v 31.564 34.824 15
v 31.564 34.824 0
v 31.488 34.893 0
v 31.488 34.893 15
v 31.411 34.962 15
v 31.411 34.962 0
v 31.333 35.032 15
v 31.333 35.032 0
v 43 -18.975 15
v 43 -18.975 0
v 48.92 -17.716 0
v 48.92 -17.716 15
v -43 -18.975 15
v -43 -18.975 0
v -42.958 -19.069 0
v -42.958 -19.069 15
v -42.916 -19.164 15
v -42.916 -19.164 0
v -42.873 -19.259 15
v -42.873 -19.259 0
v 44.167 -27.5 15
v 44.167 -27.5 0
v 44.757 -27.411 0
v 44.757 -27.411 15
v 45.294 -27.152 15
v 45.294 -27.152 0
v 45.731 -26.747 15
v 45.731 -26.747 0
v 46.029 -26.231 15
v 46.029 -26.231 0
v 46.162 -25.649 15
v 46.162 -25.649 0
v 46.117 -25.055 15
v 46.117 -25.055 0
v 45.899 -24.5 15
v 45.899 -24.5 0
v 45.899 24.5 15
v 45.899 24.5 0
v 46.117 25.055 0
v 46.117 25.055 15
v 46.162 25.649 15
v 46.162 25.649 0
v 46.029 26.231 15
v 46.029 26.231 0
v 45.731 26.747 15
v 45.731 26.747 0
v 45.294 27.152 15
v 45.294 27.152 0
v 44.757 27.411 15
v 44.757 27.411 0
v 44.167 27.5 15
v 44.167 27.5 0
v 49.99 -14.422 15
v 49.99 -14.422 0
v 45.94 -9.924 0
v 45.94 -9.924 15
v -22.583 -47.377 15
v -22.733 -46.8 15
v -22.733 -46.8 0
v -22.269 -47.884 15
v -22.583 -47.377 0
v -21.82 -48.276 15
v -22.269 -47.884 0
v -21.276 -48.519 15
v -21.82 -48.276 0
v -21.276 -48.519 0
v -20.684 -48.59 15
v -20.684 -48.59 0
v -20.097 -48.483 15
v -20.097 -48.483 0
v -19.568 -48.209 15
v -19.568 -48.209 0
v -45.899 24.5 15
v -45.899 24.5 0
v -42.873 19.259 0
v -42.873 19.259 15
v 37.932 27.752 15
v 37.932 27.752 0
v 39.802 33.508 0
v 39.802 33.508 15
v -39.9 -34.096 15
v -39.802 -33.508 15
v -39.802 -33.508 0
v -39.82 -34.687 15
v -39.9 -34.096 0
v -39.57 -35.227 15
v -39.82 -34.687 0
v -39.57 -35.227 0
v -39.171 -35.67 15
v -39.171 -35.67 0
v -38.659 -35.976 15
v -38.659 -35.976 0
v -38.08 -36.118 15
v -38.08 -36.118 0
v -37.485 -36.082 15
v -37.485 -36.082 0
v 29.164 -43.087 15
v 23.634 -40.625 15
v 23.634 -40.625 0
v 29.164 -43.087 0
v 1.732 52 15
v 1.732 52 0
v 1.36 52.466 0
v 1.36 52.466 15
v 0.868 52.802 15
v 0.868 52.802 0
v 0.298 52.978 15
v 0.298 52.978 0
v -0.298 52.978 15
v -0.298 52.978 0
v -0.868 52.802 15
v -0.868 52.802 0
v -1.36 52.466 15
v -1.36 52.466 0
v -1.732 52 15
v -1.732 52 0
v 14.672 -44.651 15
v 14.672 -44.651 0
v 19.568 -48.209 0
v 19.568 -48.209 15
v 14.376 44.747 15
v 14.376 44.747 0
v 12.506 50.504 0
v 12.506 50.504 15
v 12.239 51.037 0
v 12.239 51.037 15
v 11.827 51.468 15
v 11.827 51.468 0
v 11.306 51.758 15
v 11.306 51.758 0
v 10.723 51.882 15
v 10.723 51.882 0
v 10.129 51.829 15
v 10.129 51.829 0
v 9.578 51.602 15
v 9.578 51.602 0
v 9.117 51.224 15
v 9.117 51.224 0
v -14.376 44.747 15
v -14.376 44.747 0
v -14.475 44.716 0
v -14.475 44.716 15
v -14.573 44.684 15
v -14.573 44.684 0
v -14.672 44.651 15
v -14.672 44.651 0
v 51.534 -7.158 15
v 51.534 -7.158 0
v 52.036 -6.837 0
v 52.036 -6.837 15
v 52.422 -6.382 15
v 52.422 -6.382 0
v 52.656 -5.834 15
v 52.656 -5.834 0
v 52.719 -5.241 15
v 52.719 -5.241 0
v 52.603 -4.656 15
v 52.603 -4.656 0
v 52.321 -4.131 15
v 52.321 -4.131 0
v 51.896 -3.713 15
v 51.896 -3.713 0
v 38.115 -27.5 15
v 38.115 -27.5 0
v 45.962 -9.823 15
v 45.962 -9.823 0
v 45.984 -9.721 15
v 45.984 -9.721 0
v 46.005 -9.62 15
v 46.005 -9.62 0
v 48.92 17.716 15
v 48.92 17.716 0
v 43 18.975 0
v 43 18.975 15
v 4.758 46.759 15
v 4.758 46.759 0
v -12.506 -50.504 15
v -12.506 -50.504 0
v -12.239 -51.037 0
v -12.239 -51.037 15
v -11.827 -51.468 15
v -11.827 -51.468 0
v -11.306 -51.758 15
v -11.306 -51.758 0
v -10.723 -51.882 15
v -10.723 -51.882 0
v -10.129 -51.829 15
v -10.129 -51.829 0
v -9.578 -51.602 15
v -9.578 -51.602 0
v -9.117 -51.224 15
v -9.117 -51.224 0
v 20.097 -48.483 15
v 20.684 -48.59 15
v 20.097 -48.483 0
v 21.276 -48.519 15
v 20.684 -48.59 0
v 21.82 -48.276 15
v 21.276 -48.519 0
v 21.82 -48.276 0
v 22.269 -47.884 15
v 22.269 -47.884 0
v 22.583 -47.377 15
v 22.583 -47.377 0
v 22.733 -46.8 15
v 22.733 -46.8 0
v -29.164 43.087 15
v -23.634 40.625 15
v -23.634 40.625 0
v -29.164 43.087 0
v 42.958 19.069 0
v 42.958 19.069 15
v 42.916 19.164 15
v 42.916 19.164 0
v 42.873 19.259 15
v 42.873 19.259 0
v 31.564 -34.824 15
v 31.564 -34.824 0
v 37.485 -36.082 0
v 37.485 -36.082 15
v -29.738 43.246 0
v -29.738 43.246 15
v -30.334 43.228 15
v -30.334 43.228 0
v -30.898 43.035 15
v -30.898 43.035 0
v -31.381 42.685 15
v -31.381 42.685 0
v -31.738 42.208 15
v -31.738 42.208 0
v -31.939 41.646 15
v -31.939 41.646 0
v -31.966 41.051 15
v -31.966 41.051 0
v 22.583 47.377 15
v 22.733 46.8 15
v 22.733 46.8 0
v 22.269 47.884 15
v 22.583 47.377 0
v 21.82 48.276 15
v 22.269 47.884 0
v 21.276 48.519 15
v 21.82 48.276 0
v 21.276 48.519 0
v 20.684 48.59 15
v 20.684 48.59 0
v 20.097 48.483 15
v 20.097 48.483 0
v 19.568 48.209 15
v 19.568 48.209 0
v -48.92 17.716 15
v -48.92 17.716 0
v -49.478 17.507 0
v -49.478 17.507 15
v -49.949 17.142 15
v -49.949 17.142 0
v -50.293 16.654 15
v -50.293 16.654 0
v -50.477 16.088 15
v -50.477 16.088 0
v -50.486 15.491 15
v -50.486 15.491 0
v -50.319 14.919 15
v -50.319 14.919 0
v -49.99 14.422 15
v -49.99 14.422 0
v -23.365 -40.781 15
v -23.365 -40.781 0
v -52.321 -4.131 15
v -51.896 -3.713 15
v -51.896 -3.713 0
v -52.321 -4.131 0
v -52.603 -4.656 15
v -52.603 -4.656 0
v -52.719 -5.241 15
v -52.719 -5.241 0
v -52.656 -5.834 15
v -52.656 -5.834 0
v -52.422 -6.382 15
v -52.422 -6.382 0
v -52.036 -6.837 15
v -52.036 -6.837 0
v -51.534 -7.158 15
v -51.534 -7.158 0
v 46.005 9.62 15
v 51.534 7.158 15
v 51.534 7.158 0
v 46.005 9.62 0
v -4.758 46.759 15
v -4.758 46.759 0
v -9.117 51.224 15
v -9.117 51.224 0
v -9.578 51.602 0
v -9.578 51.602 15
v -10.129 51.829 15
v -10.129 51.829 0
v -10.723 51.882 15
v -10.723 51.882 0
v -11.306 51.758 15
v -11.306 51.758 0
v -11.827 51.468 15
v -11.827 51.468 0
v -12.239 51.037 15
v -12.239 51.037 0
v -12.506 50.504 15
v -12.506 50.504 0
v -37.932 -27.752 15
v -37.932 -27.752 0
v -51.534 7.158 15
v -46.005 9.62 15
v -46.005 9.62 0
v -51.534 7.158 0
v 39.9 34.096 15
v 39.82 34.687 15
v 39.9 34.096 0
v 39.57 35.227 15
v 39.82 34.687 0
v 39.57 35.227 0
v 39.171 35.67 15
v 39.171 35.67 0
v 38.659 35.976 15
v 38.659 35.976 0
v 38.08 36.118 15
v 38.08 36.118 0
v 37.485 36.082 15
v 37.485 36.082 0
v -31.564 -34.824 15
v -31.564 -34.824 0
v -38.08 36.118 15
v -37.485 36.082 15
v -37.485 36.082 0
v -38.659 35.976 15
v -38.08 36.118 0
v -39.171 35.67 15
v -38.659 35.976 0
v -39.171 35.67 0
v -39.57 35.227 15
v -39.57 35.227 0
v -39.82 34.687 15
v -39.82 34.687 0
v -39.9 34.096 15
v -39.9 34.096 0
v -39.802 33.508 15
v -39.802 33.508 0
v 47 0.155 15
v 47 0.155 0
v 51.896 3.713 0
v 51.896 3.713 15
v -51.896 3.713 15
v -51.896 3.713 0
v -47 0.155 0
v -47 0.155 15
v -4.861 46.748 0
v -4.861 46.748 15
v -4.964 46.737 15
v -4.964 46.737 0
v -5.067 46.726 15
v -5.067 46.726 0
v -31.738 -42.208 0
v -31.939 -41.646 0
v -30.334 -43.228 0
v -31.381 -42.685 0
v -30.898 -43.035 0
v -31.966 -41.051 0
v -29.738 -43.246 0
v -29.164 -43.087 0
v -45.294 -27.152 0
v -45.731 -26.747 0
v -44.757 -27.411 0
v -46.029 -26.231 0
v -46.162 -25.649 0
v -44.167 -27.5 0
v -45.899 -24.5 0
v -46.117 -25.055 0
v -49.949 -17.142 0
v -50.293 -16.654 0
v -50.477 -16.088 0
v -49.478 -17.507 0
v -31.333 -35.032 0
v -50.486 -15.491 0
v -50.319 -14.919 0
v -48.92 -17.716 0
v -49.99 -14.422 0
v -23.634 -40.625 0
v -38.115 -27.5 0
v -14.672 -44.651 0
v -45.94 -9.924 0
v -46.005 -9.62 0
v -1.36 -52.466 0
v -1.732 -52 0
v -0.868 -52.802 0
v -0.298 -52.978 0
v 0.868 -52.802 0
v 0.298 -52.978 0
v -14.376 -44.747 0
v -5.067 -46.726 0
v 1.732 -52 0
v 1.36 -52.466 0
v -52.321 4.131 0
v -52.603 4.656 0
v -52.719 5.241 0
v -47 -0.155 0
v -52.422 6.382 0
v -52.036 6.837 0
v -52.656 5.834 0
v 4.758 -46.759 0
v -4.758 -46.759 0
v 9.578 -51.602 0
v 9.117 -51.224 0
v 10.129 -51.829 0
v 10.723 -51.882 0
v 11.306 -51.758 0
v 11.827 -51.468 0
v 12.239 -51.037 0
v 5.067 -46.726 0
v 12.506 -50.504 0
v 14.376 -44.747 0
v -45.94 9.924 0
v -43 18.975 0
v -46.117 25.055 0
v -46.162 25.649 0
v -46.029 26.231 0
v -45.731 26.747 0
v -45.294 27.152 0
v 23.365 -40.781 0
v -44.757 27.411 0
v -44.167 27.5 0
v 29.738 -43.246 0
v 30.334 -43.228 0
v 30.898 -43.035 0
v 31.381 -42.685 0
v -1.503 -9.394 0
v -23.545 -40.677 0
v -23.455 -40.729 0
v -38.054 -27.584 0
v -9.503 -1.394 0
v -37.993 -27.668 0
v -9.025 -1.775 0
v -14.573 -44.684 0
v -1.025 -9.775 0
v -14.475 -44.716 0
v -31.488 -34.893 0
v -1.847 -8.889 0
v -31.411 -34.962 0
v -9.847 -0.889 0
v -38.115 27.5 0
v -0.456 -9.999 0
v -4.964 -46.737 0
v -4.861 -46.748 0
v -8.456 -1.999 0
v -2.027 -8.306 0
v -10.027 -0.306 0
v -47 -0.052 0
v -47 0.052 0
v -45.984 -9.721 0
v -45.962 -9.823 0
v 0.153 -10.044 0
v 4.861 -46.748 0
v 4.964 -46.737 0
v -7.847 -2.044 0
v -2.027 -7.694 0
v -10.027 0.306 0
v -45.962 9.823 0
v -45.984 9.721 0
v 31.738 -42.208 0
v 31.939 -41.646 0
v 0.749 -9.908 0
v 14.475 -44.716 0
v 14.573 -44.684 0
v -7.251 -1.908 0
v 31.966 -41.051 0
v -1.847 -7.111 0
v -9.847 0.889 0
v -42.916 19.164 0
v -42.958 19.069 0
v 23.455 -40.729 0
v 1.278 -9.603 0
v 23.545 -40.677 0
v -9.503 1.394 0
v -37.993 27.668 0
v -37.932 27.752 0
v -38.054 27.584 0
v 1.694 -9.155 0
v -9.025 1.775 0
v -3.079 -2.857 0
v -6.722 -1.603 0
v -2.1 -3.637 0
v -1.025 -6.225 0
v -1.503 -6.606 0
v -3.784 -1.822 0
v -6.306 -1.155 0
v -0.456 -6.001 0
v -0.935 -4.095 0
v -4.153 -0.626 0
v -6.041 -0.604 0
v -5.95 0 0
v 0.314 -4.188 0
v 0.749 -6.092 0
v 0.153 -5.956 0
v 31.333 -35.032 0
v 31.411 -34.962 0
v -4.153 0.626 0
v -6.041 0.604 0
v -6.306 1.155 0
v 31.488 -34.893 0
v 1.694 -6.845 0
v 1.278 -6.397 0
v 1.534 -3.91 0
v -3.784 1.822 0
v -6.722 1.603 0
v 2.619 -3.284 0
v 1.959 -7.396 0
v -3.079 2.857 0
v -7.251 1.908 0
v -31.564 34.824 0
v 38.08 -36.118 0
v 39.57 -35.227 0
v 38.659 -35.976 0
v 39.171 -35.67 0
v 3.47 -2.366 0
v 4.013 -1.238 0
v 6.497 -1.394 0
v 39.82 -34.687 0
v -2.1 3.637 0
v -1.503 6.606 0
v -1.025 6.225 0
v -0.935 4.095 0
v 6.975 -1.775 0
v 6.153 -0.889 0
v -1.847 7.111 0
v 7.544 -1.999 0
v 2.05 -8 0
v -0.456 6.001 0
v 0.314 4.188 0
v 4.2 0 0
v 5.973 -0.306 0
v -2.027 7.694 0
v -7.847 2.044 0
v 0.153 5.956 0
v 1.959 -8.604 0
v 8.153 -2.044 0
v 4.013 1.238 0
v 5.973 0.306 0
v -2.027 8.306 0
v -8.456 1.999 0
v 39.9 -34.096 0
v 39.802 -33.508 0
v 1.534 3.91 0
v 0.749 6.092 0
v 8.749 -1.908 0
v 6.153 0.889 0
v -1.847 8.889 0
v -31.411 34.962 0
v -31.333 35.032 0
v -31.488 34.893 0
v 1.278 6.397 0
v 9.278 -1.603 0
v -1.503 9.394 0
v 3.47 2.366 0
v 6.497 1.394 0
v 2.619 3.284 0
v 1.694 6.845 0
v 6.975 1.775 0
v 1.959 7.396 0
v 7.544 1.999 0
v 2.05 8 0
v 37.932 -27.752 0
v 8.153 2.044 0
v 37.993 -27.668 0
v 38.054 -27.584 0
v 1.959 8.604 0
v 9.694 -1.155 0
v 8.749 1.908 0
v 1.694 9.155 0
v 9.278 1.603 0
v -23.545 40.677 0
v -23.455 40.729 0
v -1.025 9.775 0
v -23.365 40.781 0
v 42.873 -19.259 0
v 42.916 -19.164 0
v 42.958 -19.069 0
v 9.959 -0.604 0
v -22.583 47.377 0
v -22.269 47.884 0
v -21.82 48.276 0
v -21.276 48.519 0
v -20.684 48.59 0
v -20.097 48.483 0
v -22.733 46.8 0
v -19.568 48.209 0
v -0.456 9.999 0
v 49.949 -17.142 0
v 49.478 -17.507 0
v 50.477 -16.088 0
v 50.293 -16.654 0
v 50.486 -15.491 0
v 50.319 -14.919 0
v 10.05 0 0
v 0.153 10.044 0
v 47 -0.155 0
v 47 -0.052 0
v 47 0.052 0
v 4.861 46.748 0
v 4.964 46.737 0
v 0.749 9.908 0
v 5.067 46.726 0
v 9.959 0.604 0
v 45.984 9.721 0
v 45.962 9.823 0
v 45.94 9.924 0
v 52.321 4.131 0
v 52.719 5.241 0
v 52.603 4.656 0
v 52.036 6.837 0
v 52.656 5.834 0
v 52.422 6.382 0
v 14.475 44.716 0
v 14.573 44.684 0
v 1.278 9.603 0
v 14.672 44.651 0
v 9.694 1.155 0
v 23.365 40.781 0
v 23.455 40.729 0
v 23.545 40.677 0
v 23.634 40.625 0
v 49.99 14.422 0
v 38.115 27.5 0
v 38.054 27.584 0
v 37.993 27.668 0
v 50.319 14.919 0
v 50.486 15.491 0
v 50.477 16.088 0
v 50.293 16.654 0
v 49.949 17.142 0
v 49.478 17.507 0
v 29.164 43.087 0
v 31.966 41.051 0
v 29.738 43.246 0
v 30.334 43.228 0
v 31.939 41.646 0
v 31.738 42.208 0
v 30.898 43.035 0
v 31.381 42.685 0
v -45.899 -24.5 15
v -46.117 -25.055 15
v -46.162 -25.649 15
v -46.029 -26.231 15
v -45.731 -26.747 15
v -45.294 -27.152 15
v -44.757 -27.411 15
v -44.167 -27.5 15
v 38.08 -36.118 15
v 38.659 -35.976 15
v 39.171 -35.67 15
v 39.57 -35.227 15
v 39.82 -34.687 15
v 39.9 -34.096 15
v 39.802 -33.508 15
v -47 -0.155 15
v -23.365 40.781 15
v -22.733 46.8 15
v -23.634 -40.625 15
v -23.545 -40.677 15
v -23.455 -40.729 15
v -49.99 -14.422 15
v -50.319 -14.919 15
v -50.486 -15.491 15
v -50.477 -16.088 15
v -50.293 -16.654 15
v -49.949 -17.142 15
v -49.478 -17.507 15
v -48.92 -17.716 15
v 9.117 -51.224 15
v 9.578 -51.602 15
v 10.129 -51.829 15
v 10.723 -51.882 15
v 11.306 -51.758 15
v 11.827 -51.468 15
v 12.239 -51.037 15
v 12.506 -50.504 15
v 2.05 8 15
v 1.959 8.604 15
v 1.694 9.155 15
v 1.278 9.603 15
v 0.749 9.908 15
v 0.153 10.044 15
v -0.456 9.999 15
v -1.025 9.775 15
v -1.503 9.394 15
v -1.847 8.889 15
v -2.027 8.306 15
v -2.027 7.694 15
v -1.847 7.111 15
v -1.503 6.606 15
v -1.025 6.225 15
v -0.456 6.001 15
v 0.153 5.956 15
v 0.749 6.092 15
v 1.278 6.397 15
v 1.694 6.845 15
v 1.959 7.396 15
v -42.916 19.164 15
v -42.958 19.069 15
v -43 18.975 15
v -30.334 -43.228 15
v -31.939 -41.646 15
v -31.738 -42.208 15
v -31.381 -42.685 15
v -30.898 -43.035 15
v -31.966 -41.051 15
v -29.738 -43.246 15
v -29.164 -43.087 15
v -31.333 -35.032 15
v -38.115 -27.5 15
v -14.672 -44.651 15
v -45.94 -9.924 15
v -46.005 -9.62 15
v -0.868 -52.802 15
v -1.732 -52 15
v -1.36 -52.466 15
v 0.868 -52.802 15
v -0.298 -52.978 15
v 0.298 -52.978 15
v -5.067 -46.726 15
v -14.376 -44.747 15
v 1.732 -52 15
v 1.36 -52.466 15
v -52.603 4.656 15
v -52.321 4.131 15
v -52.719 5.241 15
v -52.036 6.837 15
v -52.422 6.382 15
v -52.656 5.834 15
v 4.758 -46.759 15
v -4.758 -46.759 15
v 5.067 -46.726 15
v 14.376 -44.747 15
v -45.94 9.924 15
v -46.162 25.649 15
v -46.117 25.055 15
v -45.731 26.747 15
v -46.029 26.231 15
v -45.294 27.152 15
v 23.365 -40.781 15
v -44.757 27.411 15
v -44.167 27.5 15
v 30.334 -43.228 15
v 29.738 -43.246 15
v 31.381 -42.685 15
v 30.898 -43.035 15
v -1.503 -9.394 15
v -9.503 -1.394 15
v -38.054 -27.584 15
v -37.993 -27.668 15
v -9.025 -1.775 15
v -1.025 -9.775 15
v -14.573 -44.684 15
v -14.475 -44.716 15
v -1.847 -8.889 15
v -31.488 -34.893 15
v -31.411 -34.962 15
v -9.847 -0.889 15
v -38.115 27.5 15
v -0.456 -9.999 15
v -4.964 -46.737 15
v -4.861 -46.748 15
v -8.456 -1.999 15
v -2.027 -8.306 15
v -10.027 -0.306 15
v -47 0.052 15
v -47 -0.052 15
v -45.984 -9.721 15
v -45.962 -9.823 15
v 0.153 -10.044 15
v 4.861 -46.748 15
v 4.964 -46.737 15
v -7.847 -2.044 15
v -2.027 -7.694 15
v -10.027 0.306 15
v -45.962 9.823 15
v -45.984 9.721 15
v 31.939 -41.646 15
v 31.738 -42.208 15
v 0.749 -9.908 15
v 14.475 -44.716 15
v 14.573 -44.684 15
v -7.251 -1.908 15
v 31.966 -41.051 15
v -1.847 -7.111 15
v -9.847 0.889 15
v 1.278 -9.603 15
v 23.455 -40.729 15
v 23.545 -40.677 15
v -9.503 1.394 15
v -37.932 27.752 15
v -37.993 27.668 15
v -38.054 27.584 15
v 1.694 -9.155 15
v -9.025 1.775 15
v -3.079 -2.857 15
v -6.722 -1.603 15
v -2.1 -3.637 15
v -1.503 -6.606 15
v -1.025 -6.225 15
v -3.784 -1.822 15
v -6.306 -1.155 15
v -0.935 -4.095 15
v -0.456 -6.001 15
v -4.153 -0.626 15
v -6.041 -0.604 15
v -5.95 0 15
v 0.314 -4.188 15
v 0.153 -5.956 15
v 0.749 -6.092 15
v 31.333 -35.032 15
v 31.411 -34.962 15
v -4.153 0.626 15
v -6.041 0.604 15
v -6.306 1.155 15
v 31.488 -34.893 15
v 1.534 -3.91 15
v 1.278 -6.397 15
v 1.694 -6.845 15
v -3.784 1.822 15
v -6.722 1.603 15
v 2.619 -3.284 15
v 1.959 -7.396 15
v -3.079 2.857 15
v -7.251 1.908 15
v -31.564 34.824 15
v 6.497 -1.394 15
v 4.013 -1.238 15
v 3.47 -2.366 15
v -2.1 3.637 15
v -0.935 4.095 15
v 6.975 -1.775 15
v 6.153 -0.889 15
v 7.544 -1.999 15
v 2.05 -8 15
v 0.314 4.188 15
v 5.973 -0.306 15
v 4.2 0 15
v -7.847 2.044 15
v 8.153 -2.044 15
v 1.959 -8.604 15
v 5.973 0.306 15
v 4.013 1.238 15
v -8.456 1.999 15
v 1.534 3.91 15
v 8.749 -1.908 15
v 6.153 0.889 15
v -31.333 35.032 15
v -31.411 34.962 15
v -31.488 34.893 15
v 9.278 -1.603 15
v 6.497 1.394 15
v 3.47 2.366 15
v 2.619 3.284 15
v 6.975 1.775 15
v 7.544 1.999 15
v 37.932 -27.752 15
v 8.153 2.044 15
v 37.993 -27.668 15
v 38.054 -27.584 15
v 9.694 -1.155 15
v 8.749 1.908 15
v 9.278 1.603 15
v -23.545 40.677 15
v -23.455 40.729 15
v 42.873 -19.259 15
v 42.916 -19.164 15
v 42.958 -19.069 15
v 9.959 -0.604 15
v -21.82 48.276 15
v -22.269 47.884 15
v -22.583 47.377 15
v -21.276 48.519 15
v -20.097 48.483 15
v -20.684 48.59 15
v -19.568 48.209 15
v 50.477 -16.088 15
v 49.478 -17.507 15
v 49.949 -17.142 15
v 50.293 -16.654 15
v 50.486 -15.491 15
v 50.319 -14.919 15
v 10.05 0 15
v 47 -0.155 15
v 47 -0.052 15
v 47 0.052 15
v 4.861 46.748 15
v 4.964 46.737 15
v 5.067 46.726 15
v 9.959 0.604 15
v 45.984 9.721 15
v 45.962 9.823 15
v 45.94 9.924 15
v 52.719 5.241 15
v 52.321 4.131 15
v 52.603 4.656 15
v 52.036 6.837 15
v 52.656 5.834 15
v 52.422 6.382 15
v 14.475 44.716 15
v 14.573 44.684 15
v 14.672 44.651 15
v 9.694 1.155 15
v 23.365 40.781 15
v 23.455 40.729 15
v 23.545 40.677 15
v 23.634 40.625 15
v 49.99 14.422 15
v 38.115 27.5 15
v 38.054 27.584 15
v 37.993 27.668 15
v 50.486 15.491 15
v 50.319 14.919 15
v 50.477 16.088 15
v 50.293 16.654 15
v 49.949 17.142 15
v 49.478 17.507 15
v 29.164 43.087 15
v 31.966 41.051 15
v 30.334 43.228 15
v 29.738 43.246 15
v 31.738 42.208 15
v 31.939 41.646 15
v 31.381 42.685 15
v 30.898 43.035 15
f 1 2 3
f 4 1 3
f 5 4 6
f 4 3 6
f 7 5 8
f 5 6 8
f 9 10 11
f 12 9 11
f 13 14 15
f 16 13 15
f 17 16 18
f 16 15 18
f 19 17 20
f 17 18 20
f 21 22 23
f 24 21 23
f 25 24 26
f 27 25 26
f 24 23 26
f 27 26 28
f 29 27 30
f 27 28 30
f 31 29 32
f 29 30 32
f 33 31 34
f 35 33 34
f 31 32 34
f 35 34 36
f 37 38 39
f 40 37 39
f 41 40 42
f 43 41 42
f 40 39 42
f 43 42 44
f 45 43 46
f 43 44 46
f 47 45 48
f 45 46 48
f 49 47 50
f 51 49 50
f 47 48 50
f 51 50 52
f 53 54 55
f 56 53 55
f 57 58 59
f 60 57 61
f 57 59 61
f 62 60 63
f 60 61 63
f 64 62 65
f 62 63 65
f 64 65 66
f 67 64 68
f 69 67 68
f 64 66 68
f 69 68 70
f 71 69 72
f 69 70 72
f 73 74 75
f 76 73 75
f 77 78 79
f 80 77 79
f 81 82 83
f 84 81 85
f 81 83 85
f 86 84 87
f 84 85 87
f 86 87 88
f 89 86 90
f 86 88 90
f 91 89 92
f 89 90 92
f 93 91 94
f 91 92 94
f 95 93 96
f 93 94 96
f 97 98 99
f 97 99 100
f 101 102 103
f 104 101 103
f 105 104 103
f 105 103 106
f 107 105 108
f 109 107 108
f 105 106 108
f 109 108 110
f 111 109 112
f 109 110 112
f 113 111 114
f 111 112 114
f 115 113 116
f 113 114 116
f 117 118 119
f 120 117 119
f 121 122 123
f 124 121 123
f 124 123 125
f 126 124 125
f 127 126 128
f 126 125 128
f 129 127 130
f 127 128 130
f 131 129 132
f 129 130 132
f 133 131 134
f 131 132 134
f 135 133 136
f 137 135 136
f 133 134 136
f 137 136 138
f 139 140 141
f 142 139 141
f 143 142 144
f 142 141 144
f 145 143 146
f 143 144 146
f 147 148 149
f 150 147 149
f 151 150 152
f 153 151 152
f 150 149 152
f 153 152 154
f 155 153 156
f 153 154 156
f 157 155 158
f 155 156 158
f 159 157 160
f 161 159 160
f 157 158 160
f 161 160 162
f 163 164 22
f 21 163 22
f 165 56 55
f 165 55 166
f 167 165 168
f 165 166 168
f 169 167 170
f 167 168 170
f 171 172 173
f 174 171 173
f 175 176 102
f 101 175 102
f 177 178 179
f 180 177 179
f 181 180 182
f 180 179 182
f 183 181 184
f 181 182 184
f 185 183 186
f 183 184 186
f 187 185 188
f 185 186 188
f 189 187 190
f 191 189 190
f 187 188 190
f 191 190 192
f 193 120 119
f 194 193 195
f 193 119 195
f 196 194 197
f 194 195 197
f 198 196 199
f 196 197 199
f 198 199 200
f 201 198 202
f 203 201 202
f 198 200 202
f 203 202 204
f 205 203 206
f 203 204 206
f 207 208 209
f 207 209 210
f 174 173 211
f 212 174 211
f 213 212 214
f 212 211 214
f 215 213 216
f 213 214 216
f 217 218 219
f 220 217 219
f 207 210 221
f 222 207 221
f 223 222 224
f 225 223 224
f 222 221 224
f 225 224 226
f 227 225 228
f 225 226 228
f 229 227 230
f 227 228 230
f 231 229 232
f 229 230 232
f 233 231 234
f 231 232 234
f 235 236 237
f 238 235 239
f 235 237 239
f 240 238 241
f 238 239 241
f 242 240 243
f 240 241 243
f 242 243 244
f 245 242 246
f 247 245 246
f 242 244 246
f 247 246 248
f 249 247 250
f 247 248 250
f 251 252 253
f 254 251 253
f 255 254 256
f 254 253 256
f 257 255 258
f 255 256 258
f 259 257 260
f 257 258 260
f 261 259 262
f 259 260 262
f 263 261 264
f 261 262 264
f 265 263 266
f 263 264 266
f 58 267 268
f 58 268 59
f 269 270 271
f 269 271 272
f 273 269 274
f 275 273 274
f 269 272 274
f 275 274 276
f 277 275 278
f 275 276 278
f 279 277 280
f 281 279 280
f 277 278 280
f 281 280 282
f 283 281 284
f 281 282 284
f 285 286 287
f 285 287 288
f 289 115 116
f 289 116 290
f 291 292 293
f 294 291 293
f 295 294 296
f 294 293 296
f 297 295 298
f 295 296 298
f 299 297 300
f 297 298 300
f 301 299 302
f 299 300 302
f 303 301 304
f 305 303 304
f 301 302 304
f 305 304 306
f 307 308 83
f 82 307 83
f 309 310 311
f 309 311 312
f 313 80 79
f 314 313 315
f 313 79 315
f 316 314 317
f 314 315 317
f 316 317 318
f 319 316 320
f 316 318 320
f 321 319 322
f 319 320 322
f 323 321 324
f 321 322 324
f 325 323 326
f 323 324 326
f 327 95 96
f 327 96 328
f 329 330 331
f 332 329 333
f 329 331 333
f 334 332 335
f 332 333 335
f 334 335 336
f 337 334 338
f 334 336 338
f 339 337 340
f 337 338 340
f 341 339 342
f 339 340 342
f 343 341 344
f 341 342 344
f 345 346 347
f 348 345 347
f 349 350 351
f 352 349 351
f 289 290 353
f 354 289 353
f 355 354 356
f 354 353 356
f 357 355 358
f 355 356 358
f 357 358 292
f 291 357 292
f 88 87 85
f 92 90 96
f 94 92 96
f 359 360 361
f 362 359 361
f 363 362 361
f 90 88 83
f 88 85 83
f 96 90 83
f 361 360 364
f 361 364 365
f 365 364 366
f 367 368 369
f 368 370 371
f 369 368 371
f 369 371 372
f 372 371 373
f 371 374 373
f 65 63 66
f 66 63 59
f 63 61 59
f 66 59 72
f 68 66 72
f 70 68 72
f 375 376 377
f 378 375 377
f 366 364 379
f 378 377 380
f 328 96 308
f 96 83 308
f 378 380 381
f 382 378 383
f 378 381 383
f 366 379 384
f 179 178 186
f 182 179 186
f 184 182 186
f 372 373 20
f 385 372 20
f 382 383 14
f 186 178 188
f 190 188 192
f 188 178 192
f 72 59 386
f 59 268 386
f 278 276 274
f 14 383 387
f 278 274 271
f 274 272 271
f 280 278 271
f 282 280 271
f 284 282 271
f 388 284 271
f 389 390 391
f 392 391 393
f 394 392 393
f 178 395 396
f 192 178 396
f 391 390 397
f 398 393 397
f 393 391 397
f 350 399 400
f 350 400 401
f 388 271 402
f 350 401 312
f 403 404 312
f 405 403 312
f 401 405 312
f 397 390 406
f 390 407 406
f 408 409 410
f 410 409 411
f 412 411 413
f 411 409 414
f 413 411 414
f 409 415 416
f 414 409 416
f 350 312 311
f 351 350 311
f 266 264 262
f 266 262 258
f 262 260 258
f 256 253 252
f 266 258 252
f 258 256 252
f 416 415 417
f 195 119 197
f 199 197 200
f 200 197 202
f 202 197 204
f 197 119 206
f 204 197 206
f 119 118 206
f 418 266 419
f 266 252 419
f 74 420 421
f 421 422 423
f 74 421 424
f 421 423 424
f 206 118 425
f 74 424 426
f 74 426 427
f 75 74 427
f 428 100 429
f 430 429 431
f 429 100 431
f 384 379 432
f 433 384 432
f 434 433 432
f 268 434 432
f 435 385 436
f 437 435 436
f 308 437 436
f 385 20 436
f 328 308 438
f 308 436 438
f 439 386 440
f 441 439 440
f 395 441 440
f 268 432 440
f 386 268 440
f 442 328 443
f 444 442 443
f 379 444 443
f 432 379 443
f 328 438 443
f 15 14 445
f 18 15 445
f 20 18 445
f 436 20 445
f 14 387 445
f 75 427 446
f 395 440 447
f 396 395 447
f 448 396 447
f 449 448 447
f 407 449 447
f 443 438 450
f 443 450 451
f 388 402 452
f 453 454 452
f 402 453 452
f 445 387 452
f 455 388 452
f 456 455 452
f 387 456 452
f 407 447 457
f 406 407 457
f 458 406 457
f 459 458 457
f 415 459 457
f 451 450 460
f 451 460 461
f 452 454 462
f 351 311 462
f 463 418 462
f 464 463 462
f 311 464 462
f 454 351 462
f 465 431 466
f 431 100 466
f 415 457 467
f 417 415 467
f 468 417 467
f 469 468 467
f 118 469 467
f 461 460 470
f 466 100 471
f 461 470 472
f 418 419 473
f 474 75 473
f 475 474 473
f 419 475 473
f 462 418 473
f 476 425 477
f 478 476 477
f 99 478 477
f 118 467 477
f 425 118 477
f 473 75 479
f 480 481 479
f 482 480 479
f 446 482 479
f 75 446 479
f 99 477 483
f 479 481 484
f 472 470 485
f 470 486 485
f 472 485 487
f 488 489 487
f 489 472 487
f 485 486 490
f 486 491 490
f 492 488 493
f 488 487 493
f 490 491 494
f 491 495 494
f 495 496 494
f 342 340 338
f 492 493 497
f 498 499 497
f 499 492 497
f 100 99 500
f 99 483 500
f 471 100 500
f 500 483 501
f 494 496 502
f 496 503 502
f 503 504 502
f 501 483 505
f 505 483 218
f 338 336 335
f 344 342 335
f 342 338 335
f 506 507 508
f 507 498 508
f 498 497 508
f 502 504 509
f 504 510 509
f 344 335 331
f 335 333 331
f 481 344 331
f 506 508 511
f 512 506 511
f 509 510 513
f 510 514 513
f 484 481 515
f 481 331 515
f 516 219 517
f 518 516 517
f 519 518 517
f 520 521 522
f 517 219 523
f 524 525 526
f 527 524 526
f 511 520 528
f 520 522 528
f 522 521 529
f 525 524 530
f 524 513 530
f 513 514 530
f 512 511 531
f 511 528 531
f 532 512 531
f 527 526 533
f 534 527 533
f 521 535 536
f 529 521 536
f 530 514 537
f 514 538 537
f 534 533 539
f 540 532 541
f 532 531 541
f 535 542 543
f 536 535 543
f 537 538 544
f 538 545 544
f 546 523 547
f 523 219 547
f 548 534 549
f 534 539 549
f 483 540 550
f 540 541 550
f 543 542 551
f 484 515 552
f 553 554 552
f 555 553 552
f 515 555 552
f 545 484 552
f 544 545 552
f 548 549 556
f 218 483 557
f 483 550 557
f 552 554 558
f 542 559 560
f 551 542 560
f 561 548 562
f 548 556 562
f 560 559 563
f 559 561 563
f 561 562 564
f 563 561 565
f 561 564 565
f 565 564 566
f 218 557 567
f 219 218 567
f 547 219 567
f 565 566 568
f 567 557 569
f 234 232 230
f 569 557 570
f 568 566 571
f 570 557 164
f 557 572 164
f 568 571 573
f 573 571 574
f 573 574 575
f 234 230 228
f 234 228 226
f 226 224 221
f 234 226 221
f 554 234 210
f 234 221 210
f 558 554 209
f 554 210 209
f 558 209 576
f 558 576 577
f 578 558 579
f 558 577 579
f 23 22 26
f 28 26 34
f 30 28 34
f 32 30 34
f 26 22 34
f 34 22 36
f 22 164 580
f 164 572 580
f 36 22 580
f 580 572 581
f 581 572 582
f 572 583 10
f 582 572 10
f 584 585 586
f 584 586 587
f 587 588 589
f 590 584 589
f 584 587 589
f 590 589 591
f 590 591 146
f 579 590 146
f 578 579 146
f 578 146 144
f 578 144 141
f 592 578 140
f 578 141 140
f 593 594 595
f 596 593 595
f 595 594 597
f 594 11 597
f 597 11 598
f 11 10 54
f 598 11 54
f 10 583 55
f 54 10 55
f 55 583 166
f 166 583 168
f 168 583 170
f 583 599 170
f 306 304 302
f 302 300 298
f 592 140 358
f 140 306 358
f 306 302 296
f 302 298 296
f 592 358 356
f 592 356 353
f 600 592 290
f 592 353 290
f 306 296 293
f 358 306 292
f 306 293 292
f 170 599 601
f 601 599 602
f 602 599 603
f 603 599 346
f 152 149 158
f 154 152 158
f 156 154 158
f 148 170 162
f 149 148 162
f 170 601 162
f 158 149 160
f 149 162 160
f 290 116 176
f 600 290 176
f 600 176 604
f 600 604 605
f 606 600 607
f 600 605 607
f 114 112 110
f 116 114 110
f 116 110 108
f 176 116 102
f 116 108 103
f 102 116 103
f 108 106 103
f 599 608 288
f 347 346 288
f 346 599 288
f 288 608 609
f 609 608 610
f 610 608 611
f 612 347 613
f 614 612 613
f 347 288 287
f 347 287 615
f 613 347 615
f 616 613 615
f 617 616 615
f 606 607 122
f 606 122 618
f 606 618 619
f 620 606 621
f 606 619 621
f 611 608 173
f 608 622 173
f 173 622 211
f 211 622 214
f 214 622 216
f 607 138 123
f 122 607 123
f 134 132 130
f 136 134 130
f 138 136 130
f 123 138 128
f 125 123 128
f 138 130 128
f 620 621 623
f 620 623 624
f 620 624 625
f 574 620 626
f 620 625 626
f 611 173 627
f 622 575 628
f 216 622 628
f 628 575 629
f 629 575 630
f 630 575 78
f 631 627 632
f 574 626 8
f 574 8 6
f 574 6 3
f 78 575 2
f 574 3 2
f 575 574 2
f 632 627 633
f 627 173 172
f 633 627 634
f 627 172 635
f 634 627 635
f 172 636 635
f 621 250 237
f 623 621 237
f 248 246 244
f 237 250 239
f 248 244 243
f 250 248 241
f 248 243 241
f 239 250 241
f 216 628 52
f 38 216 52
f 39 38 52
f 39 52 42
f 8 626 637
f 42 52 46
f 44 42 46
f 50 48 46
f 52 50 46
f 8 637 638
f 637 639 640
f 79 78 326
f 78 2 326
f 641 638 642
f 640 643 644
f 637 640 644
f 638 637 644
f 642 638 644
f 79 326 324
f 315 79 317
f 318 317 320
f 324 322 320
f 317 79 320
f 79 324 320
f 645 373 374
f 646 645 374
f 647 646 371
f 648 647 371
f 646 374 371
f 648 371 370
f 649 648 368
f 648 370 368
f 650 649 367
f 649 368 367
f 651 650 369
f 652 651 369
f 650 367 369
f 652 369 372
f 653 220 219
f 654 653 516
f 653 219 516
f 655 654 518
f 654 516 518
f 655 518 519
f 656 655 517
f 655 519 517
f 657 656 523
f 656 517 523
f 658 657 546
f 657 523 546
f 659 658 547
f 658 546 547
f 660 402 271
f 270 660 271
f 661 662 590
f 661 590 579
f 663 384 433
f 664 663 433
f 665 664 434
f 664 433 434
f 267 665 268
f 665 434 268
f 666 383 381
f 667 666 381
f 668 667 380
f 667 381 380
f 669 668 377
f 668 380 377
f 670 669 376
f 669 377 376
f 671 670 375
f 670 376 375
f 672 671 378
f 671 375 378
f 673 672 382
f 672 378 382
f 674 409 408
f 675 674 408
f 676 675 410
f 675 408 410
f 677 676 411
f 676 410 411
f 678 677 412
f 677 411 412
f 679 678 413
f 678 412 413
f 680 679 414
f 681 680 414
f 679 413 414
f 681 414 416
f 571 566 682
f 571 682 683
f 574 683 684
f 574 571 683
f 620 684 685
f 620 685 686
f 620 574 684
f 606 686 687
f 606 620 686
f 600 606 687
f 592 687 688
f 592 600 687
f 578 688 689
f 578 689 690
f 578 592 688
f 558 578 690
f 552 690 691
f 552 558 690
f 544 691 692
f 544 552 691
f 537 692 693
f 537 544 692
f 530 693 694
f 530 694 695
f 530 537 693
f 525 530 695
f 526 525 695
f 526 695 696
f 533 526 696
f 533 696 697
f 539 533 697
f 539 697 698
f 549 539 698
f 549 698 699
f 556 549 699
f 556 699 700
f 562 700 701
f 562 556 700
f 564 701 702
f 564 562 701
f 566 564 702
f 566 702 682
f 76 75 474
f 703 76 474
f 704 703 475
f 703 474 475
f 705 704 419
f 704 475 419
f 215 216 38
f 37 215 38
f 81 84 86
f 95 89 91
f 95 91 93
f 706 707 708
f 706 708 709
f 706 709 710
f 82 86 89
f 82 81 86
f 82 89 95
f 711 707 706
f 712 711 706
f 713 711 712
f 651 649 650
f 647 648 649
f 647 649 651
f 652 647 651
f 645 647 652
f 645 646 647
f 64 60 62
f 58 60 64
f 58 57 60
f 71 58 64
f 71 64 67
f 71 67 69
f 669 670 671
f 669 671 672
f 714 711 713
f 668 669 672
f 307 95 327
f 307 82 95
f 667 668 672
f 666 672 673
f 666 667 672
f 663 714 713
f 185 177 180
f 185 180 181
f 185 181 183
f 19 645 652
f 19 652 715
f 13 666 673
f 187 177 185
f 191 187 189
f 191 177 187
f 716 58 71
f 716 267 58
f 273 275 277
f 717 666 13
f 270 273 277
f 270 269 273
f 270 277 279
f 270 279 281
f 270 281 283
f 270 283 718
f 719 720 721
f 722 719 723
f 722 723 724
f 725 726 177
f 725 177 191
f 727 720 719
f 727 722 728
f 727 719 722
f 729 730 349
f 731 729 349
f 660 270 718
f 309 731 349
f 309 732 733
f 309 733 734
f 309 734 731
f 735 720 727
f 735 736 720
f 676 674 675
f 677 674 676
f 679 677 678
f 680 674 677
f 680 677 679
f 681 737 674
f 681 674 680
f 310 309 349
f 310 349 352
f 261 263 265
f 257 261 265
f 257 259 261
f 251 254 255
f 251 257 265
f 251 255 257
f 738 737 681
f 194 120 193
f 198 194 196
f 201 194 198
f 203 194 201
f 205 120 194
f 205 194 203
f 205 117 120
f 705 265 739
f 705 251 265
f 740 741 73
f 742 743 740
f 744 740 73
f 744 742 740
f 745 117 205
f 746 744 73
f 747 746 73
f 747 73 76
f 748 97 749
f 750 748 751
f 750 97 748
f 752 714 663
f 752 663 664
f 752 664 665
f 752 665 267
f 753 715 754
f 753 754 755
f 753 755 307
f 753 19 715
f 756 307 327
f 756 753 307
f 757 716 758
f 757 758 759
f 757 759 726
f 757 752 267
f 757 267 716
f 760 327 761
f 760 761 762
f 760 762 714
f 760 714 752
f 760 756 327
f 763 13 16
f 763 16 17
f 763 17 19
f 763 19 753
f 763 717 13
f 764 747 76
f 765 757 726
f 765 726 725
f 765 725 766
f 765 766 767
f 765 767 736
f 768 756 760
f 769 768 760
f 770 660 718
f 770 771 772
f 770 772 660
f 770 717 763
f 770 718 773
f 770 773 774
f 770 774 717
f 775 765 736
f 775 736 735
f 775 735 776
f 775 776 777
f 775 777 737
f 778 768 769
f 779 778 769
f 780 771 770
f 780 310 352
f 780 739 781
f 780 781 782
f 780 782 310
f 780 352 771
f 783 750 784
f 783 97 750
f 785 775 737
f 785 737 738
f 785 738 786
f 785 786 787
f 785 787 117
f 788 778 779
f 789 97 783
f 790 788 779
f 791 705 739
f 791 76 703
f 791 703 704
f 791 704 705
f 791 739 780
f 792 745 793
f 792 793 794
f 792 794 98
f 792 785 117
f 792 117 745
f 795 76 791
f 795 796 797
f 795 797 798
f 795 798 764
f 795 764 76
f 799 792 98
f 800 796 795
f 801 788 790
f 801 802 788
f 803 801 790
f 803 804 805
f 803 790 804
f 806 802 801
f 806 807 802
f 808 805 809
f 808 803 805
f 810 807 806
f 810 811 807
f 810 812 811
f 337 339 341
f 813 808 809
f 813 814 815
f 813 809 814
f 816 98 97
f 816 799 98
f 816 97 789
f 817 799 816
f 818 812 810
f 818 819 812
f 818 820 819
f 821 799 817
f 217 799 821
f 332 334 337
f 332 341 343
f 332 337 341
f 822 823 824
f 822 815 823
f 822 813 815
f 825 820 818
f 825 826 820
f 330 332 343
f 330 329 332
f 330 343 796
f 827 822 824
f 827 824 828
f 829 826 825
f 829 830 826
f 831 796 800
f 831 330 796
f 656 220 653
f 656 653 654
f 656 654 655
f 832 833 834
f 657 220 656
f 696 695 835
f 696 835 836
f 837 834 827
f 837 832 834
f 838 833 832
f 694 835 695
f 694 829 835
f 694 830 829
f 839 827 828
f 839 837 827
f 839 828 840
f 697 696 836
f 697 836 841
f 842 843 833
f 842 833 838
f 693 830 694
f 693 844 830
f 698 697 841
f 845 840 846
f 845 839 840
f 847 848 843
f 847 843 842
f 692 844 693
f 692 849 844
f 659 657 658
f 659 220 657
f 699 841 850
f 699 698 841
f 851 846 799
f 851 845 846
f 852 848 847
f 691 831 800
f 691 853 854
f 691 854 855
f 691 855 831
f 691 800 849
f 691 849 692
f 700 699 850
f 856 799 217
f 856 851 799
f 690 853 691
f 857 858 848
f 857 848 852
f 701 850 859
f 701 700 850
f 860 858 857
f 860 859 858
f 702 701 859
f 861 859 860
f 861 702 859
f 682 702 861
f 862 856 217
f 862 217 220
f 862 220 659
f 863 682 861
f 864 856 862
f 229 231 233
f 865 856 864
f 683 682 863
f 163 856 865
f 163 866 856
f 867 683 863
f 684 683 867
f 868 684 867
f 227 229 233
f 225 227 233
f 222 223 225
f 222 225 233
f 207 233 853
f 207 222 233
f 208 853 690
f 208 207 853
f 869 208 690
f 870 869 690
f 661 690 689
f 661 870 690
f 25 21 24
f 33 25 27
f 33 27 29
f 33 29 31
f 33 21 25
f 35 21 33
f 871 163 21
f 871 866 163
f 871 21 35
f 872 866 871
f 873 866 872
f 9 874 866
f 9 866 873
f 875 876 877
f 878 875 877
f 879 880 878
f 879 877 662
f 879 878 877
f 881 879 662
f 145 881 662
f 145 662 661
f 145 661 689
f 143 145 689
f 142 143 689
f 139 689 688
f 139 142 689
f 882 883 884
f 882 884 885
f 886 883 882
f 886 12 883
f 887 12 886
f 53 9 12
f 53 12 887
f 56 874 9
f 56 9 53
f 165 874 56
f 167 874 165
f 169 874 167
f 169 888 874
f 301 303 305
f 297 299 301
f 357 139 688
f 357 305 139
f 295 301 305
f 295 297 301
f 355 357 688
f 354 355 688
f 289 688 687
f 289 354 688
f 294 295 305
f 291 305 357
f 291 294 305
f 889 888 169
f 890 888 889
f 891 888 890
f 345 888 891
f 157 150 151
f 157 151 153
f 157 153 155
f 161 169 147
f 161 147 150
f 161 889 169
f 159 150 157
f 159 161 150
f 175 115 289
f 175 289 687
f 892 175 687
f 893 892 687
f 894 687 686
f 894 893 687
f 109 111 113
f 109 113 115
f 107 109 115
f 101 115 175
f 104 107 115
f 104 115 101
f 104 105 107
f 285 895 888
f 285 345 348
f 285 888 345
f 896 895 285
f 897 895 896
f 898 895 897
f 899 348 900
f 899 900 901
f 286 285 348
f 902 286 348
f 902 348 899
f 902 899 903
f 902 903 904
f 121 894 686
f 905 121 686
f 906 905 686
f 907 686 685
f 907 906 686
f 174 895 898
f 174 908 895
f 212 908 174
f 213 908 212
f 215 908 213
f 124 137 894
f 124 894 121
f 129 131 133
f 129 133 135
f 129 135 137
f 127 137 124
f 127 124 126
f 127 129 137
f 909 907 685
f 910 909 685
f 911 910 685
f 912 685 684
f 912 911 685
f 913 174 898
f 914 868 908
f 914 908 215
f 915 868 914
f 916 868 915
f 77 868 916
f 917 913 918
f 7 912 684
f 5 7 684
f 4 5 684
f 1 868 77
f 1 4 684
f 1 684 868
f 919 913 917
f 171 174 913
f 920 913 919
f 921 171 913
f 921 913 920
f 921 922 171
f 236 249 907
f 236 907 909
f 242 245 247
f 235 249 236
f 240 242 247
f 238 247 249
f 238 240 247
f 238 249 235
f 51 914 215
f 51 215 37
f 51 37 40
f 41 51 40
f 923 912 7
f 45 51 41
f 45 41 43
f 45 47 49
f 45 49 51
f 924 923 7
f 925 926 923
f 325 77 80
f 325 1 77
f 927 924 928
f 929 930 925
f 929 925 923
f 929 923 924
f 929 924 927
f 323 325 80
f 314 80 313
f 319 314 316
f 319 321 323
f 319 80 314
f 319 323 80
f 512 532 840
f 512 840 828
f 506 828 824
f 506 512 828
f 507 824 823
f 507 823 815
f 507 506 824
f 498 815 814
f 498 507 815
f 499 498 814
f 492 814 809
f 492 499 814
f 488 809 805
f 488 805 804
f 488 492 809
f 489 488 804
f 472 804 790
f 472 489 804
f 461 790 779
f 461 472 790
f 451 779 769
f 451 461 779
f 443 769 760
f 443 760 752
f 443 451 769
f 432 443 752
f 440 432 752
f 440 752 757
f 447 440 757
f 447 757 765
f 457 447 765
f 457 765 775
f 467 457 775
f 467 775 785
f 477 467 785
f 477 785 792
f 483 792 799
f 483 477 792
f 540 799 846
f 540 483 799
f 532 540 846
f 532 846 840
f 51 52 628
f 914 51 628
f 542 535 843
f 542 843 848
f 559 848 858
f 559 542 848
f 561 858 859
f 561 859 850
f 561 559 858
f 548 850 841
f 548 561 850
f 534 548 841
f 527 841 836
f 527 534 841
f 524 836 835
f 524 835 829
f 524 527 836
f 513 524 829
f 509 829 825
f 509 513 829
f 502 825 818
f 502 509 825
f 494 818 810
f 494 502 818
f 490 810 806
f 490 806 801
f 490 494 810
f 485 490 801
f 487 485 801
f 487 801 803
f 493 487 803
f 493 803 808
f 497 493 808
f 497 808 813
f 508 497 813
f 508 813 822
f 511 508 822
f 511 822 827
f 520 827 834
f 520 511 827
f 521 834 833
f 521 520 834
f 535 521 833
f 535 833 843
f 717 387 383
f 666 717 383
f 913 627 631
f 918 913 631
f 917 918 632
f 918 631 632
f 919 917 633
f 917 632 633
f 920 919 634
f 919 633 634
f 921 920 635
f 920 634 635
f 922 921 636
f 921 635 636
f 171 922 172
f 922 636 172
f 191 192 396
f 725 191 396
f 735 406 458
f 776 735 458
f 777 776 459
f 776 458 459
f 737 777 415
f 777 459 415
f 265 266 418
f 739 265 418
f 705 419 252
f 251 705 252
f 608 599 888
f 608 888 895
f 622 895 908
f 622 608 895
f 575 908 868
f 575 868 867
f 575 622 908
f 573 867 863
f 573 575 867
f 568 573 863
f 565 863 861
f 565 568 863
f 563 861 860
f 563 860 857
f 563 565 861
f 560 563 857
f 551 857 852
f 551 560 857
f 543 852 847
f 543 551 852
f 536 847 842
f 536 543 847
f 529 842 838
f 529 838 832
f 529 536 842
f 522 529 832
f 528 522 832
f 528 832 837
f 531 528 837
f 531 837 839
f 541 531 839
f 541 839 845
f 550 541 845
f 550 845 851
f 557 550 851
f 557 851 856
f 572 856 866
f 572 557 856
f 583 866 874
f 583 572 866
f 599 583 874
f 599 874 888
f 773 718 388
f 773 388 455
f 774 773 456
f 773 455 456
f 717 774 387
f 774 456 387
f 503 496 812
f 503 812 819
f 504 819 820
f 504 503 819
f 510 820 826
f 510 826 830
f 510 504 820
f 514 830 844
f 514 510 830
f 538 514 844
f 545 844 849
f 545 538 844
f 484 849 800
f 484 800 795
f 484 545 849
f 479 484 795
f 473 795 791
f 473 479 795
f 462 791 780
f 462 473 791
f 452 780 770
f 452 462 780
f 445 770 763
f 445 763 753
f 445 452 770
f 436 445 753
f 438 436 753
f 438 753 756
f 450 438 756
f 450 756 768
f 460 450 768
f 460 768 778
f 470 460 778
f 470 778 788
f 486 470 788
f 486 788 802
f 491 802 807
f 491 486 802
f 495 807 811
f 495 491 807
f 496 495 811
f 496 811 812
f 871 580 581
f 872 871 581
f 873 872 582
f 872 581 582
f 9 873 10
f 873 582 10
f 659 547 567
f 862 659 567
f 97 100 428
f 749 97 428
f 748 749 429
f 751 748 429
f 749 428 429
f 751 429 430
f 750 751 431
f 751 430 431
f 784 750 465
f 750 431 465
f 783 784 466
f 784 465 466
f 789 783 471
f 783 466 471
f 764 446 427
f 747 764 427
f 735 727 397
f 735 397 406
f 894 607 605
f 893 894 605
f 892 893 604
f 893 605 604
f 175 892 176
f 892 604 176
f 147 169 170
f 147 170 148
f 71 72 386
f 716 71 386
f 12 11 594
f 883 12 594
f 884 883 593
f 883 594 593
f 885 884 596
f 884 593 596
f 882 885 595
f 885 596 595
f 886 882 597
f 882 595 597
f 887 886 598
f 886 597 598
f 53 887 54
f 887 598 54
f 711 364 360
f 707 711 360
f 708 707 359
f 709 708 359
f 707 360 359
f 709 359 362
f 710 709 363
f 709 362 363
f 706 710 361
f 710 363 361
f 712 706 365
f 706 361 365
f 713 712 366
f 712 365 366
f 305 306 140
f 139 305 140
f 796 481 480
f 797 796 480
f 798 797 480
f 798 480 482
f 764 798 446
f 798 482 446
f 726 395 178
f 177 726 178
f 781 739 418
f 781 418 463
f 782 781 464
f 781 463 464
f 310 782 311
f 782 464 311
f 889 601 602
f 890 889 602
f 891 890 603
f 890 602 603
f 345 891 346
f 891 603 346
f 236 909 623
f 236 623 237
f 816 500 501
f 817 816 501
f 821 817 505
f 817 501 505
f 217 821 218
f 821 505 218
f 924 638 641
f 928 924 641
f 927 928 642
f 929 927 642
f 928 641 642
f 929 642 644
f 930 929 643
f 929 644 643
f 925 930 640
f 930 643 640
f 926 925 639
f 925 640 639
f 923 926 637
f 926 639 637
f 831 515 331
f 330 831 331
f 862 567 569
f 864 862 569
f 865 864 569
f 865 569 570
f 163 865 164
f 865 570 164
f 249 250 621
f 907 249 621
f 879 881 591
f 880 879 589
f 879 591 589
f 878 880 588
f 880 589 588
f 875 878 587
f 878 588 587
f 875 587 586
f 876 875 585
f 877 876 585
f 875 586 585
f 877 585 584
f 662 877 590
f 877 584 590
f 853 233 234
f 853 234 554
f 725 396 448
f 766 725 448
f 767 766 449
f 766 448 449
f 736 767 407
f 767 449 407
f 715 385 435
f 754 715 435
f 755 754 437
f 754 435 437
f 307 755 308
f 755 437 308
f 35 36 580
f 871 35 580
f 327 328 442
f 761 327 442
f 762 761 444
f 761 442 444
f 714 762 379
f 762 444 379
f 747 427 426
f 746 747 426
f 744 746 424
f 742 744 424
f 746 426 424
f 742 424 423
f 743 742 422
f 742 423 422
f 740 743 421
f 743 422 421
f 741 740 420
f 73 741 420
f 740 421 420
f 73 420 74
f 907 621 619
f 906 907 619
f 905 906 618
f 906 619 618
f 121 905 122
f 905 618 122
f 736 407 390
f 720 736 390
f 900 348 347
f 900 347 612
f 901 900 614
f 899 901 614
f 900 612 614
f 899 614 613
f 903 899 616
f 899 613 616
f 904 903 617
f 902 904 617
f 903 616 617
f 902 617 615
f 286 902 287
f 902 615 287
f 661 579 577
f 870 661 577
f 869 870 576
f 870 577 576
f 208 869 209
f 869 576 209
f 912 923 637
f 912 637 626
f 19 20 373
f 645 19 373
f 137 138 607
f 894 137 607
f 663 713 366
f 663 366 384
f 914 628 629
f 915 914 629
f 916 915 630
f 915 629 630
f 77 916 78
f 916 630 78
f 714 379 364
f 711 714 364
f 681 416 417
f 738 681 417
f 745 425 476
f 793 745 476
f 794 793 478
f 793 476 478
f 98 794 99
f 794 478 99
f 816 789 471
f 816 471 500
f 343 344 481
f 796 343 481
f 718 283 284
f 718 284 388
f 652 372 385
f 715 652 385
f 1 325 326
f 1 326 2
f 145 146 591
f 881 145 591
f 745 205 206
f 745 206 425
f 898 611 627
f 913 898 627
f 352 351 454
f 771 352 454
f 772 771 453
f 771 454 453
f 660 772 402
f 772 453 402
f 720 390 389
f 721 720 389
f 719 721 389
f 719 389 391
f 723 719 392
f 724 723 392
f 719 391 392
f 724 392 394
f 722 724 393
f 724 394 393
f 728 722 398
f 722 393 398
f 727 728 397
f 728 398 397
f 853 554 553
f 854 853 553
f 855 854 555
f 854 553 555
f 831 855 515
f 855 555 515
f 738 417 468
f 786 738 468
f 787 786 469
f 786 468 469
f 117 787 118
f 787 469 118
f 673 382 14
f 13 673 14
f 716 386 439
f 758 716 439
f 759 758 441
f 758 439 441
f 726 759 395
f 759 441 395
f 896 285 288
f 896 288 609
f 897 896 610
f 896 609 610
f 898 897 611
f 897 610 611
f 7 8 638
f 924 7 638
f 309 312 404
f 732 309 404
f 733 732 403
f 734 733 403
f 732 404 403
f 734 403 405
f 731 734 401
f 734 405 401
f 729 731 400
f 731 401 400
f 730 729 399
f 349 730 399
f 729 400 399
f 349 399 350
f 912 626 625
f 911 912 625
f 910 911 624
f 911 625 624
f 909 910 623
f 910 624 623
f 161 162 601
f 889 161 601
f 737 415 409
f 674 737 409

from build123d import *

# Parameters (mm, degrees)
SKETCH1_R           = 4.2
SKETCH1_R_2         = 2.05
BOSS_EXTRUDE1_DEPTH = 15


with BuildPart() as part:
    # Sketch1 → Boss-Extrude1 (new body)
    with BuildSketch(Plane.XY):
        with BuildLine():
            Line((-1.732050808, 52), (-4.758219757, 46.758521627))
            ThreePointArc((-4.758219757, 46.758521627), (-4.912837774, 46.742529082), (-5.067402052, 46.726025258))
            Line((-5.067402052, 46.726025258), (-9.117206581, 51.22378885))
            ThreePointArc((-9.117206581, 51.22378885), (-11.019319613, 51.841822839), (-12.505609264, 50.503561626))
            Line((-12.505609264, 50.503561626), (-14.375884531, 44.747446228))
            ThreePointArc((-14.375884531, 44.747446228), (-14.523798736, 44.699656266), (-14.671554076, 44.651377369))
            Line((-14.671554076, 44.651377369), (-19.567998292, 48.208852329))
            ThreePointArc((-19.567998292, 48.208852329), (-21.557042083, 48.417909255), (-22.732612588, 46.799875266))
            Line((-22.732612588, 46.799875266), (-23.365254167, 40.780692707))
            ThreePointArc((-23.365254167, 40.780692707), (-23.5, 40.703193978), (-23.634488785, 40.625250029))
            Line((-23.634488785, 40.625250029), (-29.163574581, 43.086957628))
            ThreePointArc((-29.163574581, 43.086957628), (-31.152618372, 42.877900702), (-31.966091658, 41.050809787))
            Line((-31.966091658, 41.050809787), (-31.333450078, 35.031627228))
            ThreePointArc((-31.333450078, 35.031627228), (-31.449138499, 34.927806797), (-31.564482923, 34.82360432))
            Line((-31.564482923, 34.82360432), (-37.484562718, 36.081956126))
            ThreePointArc((-37.484562718, 36.081956126), (-39.38667575, 35.463922137), (-39.802499132, 33.507626936))
            Line((-39.802499132, 33.507626936), (-37.932223865, 27.751511538))
            ThreePointArc((-37.932223865, 27.751511538), (-38.023798736, 27.625906858), (-38.114957694, 27.5))
            Line((-38.114957694, 27.5), (-44.167295593, 27.5))
            ThreePointArc((-44.167295593, 27.5), (-45.899346401, 26.5), (-45.899346401, 24.5))
            Line((-45.899346401, 24.5), (-42.873177451, 19.258521627))
            ThreePointArc((-42.873177451, 19.258521627), (-42.936636509, 19.116622225), (-42.999625918, 18.974513721))
            Line((-42.999625918, 18.974513721), (-48.919705713, 17.716161915))
            ThreePointArc((-48.919705713, 17.716161915), (-50.405995364, 16.377900702), (-49.990171982, 14.4216055))
            Line((-49.990171982, 14.4216055), (-45.940367454, 9.923841909))
            ThreePointArc((-45.940367454, 9.923841909), (-45.972937234, 9.771849468), (-46.005004154, 9.619750142))
            Line((-46.005004154, 9.619750142), (-51.53408995, 7.158042542))
            ThreePointArc((-51.53408995, 7.158042542), (-52.709660455, 5.540008553), (-51.896187168, 3.712917638))
            Line((-51.896187168, 3.712917638), (-46.999742952, 0.155442679))
            ThreePointArc((-46.999742952, 0.155442679), (-47, 0), (-46.999742952, -0.155442679))
            Line((-46.999742952, -0.155442679), (-51.896187168, -3.712917638))
            ThreePointArc((-51.896187168, -3.712917638), (-52.709660455, -5.540008553), (-51.53408995, -7.158042542))
            Line((-51.53408995, -7.158042542), (-46.005004154, -9.619750142))
            ThreePointArc((-46.005004154, -9.619750142), (-45.972937234, -9.771849468), (-45.940367454, -9.923841909))
            Line((-45.940367454, -9.923841909), (-49.990171982, -14.4216055))
            ThreePointArc((-49.990171982, -14.4216055), (-50.405995364, -16.377900702), (-48.919705713, -17.716161915))
            Line((-48.919705713, -17.716161915), (-42.999625918, -18.974513721))
            ThreePointArc((-42.999625918, -18.974513721), (-42.936636509, -19.116622225), (-42.873177451, -19.258521627))
            Line((-42.873177451, -19.258521627), (-45.899346401, -24.5))
            ThreePointArc((-45.899346401, -24.5), (-45.899346401, -26.5), (-44.167295593, -27.5))
            Line((-44.167295593, -27.5), (-38.114957694, -27.5))
            ThreePointArc((-38.114957694, -27.5), (-38.023798736, -27.625906858), (-37.932223865, -27.751511538))
            Line((-37.932223865, -27.751511538), (-39.802499132, -33.507626936))
            ThreePointArc((-39.802499132, -33.507626936), (-39.38667575, -35.463922137), (-37.484562718, -36.081956126))
            Line((-37.484562718, -36.081956126), (-31.564482923, -34.82360432))
            ThreePointArc((-31.564482923, -34.82360432), (-31.449138499, -34.927806797), (-31.333450078, -35.031627228))
            Line((-31.333450078, -35.031627228), (-31.966091658, -41.050809787))
            ThreePointArc((-31.966091658, -41.050809787), (-31.152618372, -42.877900702), (-29.163574581, -43.086957628))
            Line((-29.163574581, -43.086957628), (-23.634488785, -40.625250029))
            ThreePointArc((-23.634488785, -40.625250029), (-23.5, -40.703193978), (-23.365254167, -40.780692707))
            Line((-23.365254167, -40.780692707), (-22.732612588, -46.799875266))
            ThreePointArc((-22.732612588, -46.799875266), (-21.557042083, -48.417909255), (-19.567998292, -48.208852329))
            Line((-19.567998292, -48.208852329), (-14.671554076, -44.651377369))
            ThreePointArc((-14.671554076, -44.651377369), (-14.523798736, -44.699656266), (-14.375884531, -44.747446228))
            Line((-14.375884531, -44.747446228), (-12.505609264, -50.503561626))
            ThreePointArc((-12.505609264, -50.503561626), (-11.019319613, -51.841822839), (-9.117206581, -51.22378885))
            Line((-9.117206581, -51.22378885), (-5.067402052, -46.726025258))
            ThreePointArc((-5.067402052, -46.726025258), (-4.912837774, -46.742529082), (-4.758219757, -46.758521627))
            Line((-4.758219757, -46.758521627), (-1.732050808, -52))
            ThreePointArc((-1.732050808, -52), (0, -53), (1.732050808, -52))
            Line((1.732050808, -52), (4.758219757, -46.758521627))
            ThreePointArc((4.758219757, -46.758521627), (4.912837774, -46.742529082), (5.067402052, -46.726025258))
            Line((5.067402052, -46.726025258), (9.117206581, -51.22378885))
            ThreePointArc((9.117206581, -51.22378885), (11.019319613, -51.841822839), (12.505609264, -50.503561626))
            Line((12.505609264, -50.503561626), (14.375884531, -44.747446228))
            ThreePointArc((14.375884531, -44.747446228), (14.523798736, -44.699656266), (14.671554076, -44.651377369))
            Line((14.671554076, -44.651377369), (19.567998292, -48.208852329))
            ThreePointArc((19.567998292, -48.208852329), (21.557042083, -48.417909255), (22.732612588, -46.799875266))
            Line((22.732612588, -46.799875266), (23.365254167, -40.780692707))
            ThreePointArc((23.365254167, -40.780692707), (23.5, -40.703193978), (23.634488785, -40.625250029))
            Line((23.634488785, -40.625250029), (29.163574581, -43.086957628))
            ThreePointArc((29.163574581, -43.086957628), (31.152618372, -42.877900702), (31.966091658, -41.050809787))
            Line((31.966091658, -41.050809787), (31.333450078, -35.031627228))
            ThreePointArc((31.333450078, -35.031627228), (31.449138499, -34.927806797), (31.564482923, -34.82360432))
            Line((31.564482923, -34.82360432), (37.484562718, -36.081956126))
            ThreePointArc((37.484562718, -36.081956126), (39.38667575, -35.463922137), (39.802499132, -33.507626936))
            Line((39.802499132, -33.507626936), (37.932223865, -27.751511538))
            ThreePointArc((37.932223865, -27.751511538), (38.023798736, -27.625906858), (38.114957694, -27.5))
            Line((38.114957694, -27.5), (44.167295593, -27.5))
            ThreePointArc((44.167295593, -27.5), (45.899346401, -26.5), (45.899346401, -24.5))
            Line((45.899346401, -24.5), (42.873177451, -19.258521627))
            ThreePointArc((42.873177451, -19.258521627), (42.936636509, -19.116622225), (42.999625918, -18.974513721))
            Line((42.999625918, -18.974513721), (48.919705713, -17.716161915))
            ThreePointArc((48.919705713, -17.716161915), (50.405995364, -16.377900702), (49.990171982, -14.4216055))
            Line((49.990171982, -14.4216055), (45.940367454, -9.923841909))
            ThreePointArc((45.940367454, -9.923841909), (45.972937234, -9.771849468), (46.005004154, -9.619750142))
            Line((46.005004154, -9.619750142), (51.53408995, -7.158042542))
            ThreePointArc((51.53408995, -7.158042542), (52.709660455, -5.540008553), (51.896187168, -3.712917638))
            Line((51.896187168, -3.712917638), (46.999742952, -0.155442679))
            ThreePointArc((46.999742952, -0.155442679), (47, 0), (46.999742952, 0.155442679))
            Line((46.999742952, 0.155442679), (51.896187168, 3.712917638))
            ThreePointArc((51.896187168, 3.712917638), (52.709660455, 5.540008553), (51.53408995, 7.158042542))
            Line((51.53408995, 7.158042542), (46.005004154, 9.619750142))
            ThreePointArc((46.005004154, 9.619750142), (45.972937234, 9.771849468), (45.940367454, 9.923841909))
            Line((45.940367454, 9.923841909), (49.990171982, 14.4216055))
            ThreePointArc((49.990171982, 14.4216055), (50.405995364, 16.377900702), (48.919705713, 17.716161915))
            Line((48.919705713, 17.716161915), (42.999625918, 18.974513721))
            ThreePointArc((42.999625918, 18.974513721), (42.936636509, 19.116622225), (42.873177451, 19.258521627))
            Line((42.873177451, 19.258521627), (45.899346401, 24.5))
            ThreePointArc((45.899346401, 24.5), (45.899346401, 26.5), (44.167295593, 27.5))
            Line((44.167295593, 27.5), (38.114957694, 27.5))
            ThreePointArc((38.114957694, 27.5), (38.023798736, 27.625906858), (37.932223865, 27.751511538))
            Line((37.932223865, 27.751511538), (39.802499132, 33.507626936))
            ThreePointArc((39.802499132, 33.507626936), (39.38667575, 35.463922137), (37.484562718, 36.081956126))
            Line((37.484562718, 36.081956126), (31.564482923, 34.82360432))
            ThreePointArc((31.564482923, 34.82360432), (31.449138499, 34.927806797), (31.333450078, 35.031627228))
            Line((31.333450078, 35.031627228), (31.966091658, 41.050809787))
            ThreePointArc((31.966091658, 41.050809787), (31.152618372, 42.877900702), (29.163574581, 43.086957628))
            Line((29.163574581, 43.086957628), (23.634488785, 40.625250029))
            ThreePointArc((23.634488785, 40.625250029), (23.5, 40.703193978), (23.365254167, 40.780692707))
            Line((23.365254167, 40.780692707), (22.732612588, 46.799875266))
            ThreePointArc((22.732612588, 46.799875266), (21.557042083, 48.417909255), (19.567998292, 48.208852329))
            Line((19.567998292, 48.208852329), (14.671554076, 44.651377369))
            ThreePointArc((14.671554076, 44.651377369), (14.523798736, 44.699656266), (14.375884531, 44.747446228))
            Line((14.375884531, 44.747446228), (12.505609264, 50.503561626))
            ThreePointArc((12.505609264, 50.503561626), (11.019319613, 51.841822839), (9.117206581, 51.22378885))
            Line((9.117206581, 51.22378885), (5.067402052, 46.726025258))
            ThreePointArc((5.067402052, 46.726025258), (4.912837774, 46.742529082), (4.758219757, 46.758521627))
            Line((4.758219757, 46.758521627), (1.732050808, 52))
            ThreePointArc((1.732050808, 52), (0, 53), (-1.732050808, 52))
        make_face()
        Circle(SKETCH1_R, mode=Mode.SUBTRACT)
        with Locations((0, 8)):
            Circle(SKETCH1_R_2, mode=Mode.SUBTRACT)
        with Locations((8, 0)):
            Circle(SKETCH1_R_2, mode=Mode.SUBTRACT)
        with Locations((0, -8)):
            Circle(SKETCH1_R_2, mode=Mode.SUBTRACT)
        with Locations((-8, 0)):
            Circle(SKETCH1_R_2, mode=Mode.SUBTRACT)
    extrude(amount=BOSS_EXTRUDE1_DEPTH)


solid = part.part
